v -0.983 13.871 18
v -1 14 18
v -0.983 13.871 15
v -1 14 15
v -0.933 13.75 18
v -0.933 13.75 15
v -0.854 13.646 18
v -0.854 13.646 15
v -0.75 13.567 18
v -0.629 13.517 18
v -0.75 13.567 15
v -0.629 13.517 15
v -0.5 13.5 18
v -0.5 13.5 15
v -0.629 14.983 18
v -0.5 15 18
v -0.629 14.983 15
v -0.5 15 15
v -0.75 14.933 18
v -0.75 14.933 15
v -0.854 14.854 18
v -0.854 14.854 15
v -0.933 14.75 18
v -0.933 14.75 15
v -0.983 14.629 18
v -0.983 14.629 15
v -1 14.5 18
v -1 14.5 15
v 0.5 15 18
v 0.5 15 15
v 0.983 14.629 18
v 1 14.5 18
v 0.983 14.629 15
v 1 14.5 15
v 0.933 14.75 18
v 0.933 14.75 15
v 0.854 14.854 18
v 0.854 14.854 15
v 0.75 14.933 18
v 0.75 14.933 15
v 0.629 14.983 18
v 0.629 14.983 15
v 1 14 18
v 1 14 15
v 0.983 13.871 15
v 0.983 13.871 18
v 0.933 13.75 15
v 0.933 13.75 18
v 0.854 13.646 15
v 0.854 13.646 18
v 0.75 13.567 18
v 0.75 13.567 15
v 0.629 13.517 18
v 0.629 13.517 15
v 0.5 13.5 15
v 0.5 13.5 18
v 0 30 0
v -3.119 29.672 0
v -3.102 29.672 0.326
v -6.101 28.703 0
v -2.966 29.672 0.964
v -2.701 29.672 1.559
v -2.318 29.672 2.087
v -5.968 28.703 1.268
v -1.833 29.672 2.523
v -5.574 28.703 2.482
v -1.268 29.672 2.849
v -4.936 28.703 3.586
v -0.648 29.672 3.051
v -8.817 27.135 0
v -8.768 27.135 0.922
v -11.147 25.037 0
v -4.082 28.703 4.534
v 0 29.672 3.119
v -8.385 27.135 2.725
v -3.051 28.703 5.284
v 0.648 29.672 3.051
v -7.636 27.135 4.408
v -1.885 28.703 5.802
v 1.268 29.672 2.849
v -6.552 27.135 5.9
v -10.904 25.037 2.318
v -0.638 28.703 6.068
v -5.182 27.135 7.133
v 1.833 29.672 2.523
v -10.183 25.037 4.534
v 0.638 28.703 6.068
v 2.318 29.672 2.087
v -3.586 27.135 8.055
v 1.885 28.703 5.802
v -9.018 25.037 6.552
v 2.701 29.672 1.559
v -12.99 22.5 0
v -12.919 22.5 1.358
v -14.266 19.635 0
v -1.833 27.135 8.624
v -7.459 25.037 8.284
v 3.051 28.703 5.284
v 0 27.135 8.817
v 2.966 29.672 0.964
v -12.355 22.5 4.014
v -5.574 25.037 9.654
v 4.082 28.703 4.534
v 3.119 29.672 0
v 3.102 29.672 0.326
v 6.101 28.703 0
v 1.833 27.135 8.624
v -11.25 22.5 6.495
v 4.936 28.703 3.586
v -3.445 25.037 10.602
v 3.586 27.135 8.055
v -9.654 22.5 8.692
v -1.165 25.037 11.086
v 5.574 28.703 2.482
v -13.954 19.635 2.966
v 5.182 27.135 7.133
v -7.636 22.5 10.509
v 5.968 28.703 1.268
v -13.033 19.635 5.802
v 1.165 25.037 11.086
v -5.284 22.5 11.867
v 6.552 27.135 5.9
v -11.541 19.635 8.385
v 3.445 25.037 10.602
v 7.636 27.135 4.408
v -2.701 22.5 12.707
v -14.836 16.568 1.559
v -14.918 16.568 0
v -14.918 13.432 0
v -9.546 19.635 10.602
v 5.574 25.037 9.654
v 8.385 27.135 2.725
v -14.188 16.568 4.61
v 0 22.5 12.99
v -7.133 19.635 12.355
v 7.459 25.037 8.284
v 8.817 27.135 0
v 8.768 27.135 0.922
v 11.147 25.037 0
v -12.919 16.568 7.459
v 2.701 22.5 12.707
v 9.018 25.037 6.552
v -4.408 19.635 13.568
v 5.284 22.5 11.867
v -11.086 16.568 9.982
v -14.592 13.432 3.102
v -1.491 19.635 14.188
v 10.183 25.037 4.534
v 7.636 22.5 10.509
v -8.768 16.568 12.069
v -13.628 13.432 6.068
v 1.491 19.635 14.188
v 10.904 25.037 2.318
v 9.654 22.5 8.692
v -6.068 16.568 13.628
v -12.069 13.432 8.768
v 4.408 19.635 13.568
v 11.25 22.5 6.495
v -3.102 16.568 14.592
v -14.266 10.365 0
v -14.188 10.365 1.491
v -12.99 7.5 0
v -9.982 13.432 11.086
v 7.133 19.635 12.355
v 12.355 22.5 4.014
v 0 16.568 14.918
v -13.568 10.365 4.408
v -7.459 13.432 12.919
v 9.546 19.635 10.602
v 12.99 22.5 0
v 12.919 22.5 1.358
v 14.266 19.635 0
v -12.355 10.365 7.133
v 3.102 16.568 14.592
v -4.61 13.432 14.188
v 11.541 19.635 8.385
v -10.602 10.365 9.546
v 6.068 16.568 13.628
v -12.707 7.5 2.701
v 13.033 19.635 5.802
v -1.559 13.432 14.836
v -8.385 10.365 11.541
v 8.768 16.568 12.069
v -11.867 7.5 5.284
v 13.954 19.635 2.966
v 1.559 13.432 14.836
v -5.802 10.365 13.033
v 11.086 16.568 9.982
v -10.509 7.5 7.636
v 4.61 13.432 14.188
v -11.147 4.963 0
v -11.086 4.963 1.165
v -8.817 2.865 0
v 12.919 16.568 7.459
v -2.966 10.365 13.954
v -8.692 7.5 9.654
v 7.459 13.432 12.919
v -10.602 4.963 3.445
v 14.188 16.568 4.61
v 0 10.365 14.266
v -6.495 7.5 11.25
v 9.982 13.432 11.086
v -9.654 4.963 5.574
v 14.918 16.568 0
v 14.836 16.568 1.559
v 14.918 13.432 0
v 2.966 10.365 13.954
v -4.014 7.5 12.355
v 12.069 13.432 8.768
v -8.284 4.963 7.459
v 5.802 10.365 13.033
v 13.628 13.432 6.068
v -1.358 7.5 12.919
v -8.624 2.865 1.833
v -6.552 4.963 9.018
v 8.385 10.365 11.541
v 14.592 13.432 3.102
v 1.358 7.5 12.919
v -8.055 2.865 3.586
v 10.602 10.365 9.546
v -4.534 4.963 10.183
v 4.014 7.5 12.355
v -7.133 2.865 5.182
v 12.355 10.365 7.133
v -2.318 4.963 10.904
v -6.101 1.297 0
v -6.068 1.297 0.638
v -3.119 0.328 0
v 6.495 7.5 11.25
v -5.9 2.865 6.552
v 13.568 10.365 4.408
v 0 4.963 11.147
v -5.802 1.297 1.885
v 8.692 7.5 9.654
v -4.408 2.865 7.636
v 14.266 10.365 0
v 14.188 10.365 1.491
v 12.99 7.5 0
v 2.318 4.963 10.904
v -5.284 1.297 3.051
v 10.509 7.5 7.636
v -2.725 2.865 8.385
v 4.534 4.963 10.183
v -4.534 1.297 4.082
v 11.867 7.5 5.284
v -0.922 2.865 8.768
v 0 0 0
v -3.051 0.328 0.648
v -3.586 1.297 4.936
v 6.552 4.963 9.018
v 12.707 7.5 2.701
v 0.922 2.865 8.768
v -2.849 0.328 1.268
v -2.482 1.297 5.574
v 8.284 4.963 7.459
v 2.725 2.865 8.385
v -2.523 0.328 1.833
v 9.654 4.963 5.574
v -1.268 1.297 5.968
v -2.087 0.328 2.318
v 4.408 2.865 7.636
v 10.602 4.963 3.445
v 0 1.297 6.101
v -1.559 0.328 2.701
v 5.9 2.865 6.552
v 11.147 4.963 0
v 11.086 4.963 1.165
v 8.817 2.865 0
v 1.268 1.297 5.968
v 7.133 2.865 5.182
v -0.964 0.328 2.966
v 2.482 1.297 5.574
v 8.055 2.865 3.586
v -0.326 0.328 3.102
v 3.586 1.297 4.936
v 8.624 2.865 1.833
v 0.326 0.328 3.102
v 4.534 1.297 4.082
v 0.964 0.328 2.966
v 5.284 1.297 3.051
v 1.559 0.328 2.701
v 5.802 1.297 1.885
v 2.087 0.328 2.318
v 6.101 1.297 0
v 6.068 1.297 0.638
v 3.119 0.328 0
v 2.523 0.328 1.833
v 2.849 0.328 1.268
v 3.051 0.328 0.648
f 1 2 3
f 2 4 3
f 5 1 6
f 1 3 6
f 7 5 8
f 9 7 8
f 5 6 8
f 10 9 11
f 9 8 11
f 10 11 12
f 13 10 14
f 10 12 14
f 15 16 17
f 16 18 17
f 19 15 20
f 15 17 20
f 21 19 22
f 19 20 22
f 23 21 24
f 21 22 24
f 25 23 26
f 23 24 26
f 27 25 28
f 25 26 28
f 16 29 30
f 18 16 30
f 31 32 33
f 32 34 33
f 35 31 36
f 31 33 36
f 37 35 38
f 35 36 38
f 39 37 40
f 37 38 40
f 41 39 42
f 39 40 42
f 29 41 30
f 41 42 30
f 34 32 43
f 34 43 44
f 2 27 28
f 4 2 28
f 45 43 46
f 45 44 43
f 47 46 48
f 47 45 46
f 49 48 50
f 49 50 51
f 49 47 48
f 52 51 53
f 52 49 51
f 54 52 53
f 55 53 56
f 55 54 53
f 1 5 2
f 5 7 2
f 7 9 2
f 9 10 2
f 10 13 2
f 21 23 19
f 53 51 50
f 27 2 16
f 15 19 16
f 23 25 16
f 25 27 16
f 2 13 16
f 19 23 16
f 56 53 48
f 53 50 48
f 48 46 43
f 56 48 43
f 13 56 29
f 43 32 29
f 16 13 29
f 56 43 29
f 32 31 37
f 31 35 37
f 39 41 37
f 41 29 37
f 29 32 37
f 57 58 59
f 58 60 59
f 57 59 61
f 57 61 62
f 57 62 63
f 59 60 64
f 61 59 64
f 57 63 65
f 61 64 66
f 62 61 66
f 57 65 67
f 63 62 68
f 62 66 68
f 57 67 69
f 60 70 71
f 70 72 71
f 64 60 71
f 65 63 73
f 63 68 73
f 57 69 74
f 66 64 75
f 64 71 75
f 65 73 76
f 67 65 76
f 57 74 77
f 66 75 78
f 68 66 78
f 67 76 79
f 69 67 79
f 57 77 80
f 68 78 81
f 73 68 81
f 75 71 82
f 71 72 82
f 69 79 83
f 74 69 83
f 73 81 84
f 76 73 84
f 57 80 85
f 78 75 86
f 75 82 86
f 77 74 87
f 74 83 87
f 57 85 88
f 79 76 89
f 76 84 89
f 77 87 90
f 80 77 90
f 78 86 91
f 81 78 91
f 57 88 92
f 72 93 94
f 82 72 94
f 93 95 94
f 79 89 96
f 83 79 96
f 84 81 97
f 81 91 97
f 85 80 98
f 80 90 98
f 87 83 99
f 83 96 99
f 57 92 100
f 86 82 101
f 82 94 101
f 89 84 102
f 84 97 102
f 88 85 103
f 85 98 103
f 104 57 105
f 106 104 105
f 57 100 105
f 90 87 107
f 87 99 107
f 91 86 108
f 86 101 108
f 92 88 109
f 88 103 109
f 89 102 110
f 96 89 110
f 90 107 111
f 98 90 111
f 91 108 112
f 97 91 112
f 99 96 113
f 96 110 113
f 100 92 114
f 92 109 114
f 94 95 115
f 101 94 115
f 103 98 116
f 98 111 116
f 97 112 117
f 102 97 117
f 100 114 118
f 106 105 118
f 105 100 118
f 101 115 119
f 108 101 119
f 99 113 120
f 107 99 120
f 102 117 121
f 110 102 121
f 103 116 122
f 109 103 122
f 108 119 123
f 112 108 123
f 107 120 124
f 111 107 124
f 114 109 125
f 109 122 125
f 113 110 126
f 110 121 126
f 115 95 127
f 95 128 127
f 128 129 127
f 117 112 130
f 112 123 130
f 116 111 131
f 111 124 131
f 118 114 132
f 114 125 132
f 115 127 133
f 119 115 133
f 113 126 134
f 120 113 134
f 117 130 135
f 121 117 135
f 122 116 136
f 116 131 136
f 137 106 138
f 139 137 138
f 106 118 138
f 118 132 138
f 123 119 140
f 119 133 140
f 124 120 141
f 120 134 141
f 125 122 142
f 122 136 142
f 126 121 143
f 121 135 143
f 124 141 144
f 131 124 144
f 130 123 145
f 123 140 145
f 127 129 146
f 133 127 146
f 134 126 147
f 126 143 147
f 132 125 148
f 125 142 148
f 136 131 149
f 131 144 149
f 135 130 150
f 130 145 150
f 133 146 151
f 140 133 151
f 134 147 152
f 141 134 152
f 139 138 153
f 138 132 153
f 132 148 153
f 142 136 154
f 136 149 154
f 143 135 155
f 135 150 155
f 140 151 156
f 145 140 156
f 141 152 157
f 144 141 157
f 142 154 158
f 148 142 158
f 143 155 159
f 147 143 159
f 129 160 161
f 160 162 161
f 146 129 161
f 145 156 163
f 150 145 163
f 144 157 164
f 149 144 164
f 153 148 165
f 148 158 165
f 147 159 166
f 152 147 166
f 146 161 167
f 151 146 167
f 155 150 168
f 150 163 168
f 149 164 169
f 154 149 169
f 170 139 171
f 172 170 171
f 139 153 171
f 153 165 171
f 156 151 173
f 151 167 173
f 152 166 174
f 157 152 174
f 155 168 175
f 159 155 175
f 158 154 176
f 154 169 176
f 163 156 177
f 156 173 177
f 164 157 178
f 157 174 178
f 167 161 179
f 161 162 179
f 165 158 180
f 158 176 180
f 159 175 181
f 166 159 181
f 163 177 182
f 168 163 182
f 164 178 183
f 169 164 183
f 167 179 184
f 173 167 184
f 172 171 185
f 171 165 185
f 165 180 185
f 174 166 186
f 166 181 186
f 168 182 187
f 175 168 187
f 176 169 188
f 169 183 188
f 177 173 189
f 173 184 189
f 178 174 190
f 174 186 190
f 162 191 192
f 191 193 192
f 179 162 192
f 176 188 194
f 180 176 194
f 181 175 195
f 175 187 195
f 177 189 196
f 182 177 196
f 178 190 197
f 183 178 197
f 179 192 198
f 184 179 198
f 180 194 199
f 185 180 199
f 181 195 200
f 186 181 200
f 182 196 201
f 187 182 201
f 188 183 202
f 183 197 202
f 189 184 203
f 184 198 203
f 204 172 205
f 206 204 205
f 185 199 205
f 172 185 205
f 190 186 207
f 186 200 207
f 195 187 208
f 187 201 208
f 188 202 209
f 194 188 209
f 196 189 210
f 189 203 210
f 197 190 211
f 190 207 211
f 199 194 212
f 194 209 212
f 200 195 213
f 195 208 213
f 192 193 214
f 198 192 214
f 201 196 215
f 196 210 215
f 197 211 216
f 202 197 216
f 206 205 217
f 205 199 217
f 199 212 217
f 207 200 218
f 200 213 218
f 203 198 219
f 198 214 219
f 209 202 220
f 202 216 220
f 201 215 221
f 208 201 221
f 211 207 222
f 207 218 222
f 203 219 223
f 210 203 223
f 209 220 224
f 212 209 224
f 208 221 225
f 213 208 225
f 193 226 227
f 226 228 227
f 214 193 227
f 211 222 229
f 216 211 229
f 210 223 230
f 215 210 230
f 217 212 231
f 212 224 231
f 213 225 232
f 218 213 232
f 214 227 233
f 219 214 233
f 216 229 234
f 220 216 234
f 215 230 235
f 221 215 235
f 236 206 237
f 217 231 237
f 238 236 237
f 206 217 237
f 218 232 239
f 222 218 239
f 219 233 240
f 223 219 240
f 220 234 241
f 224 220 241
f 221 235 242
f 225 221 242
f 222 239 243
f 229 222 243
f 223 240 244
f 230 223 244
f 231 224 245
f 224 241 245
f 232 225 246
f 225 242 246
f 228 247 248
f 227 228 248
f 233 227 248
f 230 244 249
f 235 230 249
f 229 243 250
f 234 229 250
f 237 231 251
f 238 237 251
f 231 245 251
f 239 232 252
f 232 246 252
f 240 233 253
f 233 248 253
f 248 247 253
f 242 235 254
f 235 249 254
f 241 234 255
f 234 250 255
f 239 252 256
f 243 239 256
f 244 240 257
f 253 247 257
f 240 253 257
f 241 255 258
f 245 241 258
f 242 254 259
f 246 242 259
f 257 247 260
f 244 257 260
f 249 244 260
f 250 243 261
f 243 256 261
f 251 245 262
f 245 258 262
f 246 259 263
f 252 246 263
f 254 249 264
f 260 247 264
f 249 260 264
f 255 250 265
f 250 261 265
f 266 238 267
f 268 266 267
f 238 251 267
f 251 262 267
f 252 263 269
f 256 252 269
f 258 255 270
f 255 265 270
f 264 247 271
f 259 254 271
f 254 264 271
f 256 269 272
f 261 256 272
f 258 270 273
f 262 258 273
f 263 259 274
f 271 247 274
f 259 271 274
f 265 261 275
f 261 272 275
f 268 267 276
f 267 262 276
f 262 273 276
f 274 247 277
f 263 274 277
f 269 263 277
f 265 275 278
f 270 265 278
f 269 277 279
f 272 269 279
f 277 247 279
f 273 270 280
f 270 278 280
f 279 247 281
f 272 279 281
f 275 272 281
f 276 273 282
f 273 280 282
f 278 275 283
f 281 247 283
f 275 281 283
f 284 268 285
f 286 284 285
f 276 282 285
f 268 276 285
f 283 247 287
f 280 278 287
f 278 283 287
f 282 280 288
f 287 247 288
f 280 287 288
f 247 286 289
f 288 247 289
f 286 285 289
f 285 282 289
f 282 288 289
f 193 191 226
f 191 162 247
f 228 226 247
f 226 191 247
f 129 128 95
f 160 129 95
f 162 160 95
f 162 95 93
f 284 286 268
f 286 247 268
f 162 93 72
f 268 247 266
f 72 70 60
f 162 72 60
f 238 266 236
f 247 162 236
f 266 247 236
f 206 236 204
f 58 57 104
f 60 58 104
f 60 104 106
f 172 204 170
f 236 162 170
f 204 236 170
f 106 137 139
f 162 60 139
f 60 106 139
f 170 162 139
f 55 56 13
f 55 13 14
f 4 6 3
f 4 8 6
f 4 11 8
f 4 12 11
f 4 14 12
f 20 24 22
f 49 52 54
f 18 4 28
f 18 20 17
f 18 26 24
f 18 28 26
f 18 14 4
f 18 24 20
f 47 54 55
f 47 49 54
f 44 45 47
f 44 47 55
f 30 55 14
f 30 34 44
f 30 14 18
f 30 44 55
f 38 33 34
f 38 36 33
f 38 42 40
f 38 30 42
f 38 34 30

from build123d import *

# Parameters (mm, degrees)
REVOLVE1_ANGLE      = 180
SKETCH11_W          = 3
SKETCH11_H          = 1.5
BOSS_EXTRUDE4_DEPTH = 1
FILLET1_R           = 0.5


with BuildPart() as part:
    # Sketch3 → Revolve1 (revolve)
    with BuildSketch(Plane.XY):
        with BuildLine():
            Line((0, 0), (0, 30))
            ThreePointArc((0, 30), (-15, 15), (0, 0))
        make_face()
    revolve(axis=Axis((0, 0, 0), (0, 1, 0)), revolution_arc=REVOLVE1_ANGLE)


with BuildPart() as body_2:
    # Sketch11 → Boss-Extrude4 (new, symmetric)
    with BuildSketch(Plane(origin=(0, 0, 0), x_dir=(0, 0, -1), z_dir=(1, 0, 0))):
        with Locations((-16.5, 14.25)):
            Rectangle(SKETCH11_W, SKETCH11_H)
    extrude(amount=BOSS_EXTRUDE4_DEPTH, both=True)

    # Fillet1
    fillet1_edges = [body_2.edges().sort_by_distance(p)[0] for p in [
        (1, 13.5, 16.5),
        (-1, 13.5, 16.5),
        (-1, 15, 16.5),
        (1, 15, 16.5),
    ]]
    fillet(fillet1_edges, radius=FILLET1_R)


solid = Compound([part.part, body_2.part])
